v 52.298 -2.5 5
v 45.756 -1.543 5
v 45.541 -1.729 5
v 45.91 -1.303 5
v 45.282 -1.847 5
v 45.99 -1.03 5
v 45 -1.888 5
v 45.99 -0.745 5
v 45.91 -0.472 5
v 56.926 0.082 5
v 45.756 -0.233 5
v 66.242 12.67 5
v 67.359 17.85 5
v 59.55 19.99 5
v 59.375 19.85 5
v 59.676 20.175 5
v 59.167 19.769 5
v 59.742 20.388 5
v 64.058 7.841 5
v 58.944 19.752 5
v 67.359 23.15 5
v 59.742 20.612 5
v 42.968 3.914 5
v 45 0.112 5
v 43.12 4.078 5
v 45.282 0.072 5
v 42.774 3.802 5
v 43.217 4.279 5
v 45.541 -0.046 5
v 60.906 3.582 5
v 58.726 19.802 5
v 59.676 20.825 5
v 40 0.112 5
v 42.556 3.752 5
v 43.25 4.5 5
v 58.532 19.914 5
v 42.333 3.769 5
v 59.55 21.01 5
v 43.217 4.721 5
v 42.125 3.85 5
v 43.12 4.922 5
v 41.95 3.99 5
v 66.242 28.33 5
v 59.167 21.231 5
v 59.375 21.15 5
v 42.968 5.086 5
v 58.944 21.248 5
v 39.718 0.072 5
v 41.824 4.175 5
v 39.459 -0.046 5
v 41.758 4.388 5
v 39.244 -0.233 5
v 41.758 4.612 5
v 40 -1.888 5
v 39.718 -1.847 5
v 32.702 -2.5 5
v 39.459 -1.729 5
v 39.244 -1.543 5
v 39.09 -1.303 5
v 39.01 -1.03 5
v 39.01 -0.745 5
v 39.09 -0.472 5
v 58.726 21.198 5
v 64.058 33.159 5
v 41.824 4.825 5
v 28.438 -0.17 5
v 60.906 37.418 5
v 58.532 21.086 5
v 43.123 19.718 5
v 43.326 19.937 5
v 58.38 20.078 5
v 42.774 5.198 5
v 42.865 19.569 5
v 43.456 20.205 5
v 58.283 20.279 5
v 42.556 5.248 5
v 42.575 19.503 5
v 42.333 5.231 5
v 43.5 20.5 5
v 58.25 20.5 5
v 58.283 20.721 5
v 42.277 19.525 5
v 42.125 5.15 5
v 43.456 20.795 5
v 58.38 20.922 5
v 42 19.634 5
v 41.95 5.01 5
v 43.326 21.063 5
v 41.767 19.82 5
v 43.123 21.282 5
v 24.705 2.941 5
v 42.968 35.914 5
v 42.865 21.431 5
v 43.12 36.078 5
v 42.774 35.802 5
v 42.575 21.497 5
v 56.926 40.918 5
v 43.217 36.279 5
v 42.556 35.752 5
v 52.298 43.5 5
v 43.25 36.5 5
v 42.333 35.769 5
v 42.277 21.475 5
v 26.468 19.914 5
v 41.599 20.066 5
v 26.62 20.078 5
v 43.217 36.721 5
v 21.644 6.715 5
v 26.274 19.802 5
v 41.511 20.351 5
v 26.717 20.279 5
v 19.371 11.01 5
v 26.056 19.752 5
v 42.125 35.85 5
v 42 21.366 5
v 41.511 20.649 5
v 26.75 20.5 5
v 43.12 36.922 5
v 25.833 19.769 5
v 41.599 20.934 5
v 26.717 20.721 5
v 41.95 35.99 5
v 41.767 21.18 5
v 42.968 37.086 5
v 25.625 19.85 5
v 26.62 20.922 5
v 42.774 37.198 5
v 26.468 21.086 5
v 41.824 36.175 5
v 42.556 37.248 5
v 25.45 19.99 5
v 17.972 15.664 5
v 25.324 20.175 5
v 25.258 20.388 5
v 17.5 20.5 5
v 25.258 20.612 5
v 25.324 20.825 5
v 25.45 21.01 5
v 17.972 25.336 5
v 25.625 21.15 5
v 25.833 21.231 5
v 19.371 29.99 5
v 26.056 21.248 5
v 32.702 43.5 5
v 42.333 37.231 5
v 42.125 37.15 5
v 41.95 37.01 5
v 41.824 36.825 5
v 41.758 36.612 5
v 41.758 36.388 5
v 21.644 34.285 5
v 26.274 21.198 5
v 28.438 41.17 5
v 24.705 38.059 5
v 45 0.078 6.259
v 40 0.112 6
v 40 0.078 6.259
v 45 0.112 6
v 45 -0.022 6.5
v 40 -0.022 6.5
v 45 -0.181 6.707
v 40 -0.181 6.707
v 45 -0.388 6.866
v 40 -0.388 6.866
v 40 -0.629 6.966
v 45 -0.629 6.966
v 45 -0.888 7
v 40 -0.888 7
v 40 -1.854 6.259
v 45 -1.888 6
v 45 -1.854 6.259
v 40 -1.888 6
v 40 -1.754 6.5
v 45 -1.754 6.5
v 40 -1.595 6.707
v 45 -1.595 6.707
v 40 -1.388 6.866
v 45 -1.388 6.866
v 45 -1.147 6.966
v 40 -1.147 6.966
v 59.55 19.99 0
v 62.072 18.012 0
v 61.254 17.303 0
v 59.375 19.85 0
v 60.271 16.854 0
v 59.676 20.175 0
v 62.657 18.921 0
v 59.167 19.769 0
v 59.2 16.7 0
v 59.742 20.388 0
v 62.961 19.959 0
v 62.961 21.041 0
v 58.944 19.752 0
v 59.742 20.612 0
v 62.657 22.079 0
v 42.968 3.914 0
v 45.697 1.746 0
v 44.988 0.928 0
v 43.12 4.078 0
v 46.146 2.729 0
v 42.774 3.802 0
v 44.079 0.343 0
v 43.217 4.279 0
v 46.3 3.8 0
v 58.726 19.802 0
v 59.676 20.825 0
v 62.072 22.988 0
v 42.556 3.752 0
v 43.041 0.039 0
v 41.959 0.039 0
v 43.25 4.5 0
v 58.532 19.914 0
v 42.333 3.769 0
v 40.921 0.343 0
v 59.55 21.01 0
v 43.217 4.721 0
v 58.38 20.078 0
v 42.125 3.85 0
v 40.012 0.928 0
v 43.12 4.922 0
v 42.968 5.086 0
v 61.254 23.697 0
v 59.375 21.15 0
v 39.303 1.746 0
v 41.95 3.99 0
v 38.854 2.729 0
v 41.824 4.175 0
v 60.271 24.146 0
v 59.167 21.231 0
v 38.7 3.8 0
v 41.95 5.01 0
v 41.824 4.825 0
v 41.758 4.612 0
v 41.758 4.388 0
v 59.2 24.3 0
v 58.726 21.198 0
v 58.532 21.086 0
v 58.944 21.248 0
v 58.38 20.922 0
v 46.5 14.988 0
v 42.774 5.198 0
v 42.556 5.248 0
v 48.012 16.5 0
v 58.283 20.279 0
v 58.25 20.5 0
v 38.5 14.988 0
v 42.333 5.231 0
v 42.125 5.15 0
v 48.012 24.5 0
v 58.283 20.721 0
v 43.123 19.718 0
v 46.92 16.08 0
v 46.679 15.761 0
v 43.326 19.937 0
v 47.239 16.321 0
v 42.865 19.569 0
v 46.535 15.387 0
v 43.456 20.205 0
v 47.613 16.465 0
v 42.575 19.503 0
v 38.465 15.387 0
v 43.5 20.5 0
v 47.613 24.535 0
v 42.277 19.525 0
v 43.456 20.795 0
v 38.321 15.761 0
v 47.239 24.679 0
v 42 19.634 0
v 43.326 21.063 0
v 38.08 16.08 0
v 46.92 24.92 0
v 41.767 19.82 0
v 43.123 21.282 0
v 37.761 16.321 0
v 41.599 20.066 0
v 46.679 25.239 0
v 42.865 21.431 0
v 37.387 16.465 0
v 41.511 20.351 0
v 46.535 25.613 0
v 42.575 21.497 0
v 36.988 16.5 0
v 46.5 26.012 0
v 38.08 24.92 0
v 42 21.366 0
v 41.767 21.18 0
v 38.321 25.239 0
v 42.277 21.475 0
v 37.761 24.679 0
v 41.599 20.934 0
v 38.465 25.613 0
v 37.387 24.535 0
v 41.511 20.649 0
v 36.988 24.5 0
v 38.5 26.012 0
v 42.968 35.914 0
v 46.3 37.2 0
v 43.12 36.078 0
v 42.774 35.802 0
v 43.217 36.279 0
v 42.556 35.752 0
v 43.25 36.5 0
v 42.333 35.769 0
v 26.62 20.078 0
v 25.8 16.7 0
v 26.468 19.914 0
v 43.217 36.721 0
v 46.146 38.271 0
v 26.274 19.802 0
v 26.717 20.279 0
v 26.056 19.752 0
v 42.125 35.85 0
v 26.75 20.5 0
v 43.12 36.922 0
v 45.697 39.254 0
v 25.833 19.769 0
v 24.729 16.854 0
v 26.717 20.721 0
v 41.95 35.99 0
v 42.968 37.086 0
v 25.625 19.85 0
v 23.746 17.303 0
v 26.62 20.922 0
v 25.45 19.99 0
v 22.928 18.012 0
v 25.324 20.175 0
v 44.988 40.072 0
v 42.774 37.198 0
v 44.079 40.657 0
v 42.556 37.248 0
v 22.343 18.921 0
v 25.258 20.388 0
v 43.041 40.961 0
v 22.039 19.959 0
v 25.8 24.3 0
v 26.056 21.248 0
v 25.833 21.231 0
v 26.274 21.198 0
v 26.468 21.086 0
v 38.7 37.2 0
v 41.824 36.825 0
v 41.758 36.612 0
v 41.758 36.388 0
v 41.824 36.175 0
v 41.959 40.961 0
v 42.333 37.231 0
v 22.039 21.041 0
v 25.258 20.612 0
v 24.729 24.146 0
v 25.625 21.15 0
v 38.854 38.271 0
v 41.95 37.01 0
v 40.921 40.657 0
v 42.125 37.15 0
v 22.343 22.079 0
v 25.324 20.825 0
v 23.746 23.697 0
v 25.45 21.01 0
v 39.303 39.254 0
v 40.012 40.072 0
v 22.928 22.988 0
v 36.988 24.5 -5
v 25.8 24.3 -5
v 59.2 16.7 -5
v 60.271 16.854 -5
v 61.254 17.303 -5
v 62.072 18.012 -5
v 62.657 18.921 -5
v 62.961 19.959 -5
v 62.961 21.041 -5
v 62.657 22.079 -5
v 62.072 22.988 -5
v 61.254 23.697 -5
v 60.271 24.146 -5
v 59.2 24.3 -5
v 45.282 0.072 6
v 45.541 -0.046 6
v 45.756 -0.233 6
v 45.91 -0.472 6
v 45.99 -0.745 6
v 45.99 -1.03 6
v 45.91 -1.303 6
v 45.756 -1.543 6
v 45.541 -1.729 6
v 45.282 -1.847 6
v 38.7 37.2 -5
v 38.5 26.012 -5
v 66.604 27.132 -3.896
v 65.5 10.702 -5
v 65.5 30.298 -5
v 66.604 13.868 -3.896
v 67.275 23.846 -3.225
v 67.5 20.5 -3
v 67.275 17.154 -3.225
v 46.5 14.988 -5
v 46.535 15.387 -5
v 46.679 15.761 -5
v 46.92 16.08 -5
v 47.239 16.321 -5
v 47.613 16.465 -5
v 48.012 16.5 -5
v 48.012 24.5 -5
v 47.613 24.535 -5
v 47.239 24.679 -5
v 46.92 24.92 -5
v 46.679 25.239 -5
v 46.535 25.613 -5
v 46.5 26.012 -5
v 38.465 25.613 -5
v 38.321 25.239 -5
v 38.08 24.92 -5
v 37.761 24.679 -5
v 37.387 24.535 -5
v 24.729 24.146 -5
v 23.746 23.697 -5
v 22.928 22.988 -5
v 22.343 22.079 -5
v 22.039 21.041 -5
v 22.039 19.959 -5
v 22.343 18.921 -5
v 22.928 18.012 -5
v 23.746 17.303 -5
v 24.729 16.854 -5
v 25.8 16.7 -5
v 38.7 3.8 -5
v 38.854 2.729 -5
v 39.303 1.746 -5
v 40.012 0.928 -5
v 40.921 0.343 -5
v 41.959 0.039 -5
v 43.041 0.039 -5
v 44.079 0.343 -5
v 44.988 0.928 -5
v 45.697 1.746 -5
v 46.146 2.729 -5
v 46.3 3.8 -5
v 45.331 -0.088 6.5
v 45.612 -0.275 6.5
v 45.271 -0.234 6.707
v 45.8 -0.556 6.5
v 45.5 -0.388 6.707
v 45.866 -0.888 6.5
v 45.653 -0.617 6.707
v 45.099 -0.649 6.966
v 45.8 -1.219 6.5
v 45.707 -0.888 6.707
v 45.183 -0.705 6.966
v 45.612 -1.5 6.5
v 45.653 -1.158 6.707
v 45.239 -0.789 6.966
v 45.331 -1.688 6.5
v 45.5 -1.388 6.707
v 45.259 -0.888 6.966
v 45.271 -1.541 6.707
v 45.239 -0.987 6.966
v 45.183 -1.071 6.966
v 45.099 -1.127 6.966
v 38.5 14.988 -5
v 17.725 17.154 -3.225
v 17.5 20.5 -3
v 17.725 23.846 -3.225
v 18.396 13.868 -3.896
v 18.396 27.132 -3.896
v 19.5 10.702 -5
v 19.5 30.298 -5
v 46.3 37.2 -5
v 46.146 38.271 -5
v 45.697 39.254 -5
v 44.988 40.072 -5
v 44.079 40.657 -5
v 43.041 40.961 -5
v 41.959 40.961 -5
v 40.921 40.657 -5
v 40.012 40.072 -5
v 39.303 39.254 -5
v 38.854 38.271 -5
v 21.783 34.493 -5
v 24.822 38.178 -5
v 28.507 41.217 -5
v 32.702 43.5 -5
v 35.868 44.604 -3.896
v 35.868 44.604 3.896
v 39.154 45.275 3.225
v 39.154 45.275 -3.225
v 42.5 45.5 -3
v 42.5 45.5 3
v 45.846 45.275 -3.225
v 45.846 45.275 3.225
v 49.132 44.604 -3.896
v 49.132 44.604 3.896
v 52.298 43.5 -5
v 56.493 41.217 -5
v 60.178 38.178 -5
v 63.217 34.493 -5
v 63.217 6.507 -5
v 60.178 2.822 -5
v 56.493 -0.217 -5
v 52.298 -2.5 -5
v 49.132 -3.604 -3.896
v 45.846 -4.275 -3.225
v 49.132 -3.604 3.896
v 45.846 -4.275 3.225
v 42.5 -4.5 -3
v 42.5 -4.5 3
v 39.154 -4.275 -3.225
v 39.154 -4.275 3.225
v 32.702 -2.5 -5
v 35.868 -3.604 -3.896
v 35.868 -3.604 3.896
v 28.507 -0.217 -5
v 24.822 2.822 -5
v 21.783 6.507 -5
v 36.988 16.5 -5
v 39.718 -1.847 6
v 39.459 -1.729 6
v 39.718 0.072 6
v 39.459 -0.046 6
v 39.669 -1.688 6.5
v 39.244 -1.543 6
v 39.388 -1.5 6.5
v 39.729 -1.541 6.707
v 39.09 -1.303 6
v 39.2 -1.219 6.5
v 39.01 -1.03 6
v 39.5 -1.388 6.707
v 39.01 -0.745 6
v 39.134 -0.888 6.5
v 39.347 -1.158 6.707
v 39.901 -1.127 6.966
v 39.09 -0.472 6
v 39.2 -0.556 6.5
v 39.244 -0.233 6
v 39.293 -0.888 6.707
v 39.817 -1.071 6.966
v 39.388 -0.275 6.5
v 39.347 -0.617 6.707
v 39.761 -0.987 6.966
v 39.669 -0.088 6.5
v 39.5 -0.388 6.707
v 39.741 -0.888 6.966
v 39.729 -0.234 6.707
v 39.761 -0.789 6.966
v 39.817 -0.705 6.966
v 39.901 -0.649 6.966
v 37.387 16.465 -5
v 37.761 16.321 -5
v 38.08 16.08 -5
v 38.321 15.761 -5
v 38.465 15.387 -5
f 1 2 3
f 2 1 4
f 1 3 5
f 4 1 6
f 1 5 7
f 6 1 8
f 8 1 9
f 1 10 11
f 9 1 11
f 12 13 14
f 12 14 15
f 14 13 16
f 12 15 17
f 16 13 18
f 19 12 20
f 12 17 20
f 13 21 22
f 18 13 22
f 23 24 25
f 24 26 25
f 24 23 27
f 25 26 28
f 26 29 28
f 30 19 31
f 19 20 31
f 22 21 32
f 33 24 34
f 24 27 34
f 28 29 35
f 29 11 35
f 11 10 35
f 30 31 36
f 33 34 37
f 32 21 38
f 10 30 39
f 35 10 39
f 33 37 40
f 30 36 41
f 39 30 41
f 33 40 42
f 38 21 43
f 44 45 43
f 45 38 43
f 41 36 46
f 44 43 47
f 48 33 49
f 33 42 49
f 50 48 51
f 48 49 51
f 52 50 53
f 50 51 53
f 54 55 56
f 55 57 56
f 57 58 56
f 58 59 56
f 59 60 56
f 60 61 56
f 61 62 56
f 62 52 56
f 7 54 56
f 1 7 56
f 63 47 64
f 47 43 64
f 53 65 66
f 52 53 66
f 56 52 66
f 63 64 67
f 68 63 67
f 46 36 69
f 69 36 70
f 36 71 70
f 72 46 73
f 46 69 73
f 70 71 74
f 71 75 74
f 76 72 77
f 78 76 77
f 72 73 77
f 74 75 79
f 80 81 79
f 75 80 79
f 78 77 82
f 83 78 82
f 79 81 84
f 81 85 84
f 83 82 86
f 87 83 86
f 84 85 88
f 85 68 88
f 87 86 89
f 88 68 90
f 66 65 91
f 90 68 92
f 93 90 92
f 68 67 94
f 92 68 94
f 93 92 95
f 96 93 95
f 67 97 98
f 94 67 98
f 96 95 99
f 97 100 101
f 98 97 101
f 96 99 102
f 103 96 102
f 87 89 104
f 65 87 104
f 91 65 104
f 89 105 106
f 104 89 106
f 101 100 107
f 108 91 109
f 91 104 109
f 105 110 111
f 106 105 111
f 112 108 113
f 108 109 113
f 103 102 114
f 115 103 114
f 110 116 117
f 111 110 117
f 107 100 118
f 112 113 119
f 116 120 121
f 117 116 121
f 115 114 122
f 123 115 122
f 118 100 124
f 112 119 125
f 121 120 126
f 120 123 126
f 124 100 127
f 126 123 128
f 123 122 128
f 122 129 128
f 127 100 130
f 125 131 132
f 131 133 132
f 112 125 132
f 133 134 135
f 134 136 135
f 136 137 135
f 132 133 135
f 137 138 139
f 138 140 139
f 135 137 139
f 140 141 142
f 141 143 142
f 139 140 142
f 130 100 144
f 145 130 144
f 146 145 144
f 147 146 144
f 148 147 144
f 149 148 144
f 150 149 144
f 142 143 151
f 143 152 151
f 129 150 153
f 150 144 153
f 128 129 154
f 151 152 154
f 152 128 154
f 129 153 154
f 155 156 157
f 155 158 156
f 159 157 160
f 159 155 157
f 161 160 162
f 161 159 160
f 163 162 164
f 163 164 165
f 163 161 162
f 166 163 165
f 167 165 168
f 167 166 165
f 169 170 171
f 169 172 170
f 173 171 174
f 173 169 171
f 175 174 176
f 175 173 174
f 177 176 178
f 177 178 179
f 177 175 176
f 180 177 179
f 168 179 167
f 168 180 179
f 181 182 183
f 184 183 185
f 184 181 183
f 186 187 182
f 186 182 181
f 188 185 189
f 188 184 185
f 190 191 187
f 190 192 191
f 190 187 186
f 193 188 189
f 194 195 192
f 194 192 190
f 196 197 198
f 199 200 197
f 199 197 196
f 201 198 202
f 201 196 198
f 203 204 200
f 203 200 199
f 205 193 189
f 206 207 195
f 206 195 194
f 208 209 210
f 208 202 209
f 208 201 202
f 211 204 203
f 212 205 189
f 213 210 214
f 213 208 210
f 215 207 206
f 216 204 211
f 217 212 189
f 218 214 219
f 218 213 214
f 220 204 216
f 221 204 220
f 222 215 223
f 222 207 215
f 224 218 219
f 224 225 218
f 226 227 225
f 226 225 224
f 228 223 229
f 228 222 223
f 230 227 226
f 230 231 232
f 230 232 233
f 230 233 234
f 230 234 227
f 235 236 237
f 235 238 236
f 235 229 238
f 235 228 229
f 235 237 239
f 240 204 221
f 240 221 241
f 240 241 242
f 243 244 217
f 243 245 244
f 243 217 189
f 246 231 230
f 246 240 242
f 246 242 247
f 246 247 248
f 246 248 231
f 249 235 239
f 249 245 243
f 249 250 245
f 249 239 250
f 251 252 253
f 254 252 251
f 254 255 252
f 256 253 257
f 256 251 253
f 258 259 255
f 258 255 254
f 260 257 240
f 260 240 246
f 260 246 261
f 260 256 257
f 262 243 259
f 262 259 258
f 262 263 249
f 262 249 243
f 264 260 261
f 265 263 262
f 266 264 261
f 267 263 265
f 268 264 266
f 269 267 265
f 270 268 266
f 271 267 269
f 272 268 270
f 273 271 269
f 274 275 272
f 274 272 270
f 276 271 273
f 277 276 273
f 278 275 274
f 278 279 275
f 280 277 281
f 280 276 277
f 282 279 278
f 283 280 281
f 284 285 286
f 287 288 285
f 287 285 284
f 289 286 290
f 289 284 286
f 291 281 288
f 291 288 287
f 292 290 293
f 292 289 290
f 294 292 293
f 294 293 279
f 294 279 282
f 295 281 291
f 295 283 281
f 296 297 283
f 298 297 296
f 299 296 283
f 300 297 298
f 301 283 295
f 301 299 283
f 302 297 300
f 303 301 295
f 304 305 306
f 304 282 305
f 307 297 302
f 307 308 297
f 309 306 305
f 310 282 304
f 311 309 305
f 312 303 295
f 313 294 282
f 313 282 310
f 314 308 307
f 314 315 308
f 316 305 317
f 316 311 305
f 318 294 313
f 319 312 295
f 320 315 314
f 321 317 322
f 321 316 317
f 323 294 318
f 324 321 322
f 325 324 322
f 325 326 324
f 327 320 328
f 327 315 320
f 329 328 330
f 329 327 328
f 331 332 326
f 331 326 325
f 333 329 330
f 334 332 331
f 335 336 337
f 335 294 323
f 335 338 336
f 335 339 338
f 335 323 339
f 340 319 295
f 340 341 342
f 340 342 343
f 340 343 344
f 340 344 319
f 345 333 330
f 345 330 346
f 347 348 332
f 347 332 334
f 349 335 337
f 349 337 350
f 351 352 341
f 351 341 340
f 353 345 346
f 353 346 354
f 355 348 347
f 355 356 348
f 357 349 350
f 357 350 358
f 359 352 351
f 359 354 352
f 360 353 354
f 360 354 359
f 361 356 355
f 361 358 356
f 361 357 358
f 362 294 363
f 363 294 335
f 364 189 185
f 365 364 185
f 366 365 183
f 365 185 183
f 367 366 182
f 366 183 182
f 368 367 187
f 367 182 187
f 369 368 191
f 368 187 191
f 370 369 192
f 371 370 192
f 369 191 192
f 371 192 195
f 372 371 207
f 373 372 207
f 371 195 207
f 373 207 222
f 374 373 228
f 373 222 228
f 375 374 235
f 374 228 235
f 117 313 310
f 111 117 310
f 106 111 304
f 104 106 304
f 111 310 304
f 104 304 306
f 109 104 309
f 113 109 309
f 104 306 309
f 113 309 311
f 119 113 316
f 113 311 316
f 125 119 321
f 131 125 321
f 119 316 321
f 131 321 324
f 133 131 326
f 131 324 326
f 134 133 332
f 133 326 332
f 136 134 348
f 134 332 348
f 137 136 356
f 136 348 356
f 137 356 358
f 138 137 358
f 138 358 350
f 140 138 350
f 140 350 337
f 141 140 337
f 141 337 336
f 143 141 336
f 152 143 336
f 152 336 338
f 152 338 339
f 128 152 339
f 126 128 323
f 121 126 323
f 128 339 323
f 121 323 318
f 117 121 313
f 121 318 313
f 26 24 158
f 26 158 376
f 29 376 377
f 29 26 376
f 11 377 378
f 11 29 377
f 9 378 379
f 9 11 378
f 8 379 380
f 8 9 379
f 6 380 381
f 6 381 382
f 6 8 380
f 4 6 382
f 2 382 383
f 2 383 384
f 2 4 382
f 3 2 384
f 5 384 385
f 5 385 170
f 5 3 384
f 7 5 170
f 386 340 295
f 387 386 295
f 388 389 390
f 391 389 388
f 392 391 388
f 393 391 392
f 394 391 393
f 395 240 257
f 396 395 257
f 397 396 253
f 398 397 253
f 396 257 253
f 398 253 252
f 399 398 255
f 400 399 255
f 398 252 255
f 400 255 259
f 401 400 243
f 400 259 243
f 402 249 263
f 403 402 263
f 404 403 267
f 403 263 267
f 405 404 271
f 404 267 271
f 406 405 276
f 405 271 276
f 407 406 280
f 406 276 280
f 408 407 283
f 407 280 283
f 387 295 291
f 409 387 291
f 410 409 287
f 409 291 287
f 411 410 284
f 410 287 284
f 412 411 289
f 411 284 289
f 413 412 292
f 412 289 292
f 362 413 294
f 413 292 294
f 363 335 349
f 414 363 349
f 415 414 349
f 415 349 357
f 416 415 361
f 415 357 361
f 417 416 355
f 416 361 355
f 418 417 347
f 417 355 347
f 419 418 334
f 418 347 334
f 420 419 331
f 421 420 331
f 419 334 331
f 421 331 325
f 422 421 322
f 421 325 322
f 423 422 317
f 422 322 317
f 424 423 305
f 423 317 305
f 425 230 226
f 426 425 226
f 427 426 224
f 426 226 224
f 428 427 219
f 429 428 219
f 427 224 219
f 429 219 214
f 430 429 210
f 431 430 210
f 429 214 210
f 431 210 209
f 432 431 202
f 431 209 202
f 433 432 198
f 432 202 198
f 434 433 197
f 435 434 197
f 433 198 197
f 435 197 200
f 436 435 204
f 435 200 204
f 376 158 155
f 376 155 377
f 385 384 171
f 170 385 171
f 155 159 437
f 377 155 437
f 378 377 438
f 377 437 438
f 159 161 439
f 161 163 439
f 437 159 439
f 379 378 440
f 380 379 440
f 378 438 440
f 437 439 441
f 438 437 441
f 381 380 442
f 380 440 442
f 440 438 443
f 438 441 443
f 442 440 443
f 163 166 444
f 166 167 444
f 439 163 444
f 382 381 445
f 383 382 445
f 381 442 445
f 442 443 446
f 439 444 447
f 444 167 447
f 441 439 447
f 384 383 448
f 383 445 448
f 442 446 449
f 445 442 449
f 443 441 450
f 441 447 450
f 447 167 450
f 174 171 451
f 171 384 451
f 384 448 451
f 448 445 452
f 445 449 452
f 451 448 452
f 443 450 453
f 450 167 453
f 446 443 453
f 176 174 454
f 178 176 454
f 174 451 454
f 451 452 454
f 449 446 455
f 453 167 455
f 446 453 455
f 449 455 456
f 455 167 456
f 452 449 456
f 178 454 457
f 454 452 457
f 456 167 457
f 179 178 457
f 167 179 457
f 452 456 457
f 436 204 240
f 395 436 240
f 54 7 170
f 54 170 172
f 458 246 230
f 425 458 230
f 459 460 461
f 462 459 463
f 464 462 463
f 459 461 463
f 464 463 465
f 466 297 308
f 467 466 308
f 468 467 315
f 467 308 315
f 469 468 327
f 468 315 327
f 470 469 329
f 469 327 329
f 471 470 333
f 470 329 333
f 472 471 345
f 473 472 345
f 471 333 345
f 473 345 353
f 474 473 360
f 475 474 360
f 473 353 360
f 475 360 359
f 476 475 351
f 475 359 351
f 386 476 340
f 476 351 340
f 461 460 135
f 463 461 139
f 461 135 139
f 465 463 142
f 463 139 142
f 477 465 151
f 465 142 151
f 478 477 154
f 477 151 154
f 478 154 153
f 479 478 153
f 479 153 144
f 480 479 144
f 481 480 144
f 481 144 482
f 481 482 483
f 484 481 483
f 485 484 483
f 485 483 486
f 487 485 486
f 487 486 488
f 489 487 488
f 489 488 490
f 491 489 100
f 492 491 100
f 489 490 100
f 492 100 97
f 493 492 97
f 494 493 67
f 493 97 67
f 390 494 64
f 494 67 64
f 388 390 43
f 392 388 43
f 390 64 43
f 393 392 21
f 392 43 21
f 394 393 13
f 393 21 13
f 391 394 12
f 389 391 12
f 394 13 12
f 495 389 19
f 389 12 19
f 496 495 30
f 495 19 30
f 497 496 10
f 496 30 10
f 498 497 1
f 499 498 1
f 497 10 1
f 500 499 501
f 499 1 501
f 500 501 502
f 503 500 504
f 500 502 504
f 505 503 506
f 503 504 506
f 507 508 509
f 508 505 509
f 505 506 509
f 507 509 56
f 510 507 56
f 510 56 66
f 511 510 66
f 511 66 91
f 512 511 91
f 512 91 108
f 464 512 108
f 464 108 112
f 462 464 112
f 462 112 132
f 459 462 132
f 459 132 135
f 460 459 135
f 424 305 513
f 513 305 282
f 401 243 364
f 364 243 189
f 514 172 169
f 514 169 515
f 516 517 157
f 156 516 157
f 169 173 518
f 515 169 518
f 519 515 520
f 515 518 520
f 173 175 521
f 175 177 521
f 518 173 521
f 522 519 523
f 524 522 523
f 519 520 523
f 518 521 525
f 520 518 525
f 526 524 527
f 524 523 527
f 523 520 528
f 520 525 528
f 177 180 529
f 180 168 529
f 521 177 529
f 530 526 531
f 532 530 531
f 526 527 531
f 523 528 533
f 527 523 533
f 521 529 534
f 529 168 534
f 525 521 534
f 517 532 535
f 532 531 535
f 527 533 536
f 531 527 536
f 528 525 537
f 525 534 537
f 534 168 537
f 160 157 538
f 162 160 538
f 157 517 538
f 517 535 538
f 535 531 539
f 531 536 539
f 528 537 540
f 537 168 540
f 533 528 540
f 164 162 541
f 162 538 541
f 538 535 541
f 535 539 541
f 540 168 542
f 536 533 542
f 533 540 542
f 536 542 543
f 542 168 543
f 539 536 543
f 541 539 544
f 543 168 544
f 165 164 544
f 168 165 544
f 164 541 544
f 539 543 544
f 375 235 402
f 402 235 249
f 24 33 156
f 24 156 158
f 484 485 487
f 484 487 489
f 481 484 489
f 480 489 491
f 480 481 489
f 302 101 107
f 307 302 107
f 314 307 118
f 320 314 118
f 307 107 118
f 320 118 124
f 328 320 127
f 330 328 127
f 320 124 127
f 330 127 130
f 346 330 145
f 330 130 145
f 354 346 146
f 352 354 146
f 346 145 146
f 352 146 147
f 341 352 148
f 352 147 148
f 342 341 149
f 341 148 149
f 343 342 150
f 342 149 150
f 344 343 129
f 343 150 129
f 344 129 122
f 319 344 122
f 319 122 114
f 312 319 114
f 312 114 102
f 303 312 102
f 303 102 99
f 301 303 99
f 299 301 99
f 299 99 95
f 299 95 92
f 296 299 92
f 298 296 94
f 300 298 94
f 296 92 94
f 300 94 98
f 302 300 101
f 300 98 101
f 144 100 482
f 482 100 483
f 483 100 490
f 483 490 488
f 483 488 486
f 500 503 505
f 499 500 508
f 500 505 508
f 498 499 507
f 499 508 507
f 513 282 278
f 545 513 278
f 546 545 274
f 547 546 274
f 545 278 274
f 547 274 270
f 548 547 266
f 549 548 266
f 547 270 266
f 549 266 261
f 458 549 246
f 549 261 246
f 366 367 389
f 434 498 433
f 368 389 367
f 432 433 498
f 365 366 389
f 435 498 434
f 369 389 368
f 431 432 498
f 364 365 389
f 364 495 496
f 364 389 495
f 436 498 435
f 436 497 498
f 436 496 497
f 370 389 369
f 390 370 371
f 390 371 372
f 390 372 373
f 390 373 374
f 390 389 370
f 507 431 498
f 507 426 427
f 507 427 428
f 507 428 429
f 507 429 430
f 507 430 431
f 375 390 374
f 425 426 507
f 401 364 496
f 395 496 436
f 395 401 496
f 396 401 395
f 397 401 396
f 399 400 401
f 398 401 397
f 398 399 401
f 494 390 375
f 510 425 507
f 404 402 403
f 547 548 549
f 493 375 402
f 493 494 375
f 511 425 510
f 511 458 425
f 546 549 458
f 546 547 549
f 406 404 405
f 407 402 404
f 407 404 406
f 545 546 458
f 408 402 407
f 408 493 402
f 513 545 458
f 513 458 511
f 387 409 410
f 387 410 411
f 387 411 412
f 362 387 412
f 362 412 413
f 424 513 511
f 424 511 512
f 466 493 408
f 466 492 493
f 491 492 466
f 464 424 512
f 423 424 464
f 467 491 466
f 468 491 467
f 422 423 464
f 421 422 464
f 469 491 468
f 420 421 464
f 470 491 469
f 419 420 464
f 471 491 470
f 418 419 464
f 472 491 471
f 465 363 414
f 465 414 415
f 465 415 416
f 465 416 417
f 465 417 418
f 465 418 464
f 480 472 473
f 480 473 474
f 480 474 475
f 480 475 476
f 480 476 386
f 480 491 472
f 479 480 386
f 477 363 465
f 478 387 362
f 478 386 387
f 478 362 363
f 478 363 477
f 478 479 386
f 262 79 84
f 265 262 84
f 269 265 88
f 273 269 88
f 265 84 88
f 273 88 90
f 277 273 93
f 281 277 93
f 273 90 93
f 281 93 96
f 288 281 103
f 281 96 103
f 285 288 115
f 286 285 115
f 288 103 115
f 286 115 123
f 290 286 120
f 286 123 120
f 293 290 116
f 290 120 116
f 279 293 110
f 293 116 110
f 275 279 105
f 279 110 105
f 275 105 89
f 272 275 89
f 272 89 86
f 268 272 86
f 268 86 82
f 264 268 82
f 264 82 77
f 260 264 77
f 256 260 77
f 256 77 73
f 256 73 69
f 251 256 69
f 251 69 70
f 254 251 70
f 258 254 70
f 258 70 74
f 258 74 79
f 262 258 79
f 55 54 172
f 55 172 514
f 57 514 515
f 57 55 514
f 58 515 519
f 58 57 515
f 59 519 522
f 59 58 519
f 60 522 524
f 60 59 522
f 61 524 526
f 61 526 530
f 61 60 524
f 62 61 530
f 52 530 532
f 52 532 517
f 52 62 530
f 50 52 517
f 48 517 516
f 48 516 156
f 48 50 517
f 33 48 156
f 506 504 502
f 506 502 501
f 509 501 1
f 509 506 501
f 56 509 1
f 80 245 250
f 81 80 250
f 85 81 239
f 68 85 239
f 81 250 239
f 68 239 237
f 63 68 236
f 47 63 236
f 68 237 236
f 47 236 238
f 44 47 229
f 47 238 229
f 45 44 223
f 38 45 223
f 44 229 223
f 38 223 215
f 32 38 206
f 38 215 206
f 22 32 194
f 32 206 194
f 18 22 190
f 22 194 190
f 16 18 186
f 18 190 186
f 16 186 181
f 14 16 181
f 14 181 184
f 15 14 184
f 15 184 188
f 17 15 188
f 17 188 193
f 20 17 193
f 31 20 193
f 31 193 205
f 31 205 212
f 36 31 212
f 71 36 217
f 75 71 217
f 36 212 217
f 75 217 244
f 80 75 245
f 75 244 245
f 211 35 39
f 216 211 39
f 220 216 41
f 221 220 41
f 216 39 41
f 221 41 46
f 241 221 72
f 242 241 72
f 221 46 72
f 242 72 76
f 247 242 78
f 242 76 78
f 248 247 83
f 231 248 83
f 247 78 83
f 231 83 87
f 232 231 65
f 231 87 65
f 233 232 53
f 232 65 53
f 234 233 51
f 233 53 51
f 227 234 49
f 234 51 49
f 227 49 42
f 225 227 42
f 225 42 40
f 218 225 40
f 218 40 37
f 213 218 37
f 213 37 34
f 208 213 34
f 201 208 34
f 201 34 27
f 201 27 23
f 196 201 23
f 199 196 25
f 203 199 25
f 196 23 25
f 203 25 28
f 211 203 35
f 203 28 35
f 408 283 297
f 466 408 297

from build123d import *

# Parameters (mm, degrees)
SKETCH10_W          = 50
SKETCH10_H          = 50
BOSS_EXTRUDE7_DEPTH = 5
SKETCH9_W           = 50
SKETCH9_H           = 50
BOSS_EXTRUDE8_DEPTH = 5
SKETCH11_R          = 0.75
CUT_EXTRUDE5_DEPTH  = 5
CHAMFER1_SIZE       = 2
SKETCH12_R          = 1
CUT_EXTRUDE6_DEPTH  = 10
SKETCH14_R          = 0.75
CUT_EXTRUDE8_DEPTH  = 5
BOSS_EXTRUDE9_DEPTH = 2
FILLET1_R           = 1
FILLET2_R           = 25


# Some blends are built 0.0001 mm under size
with BuildPart() as part:
    # Sketch10 → Boss-Extrude7 (new body)
    with BuildSketch(Plane(origin=(0, 0, 0), x_dir=(-1, 0, 0), z_dir=(0, 0, -1))):
        with Locations((-42.5, 20.5)):
            Rectangle(SKETCH10_W, SKETCH10_H)
    extrude(amount=-BOSS_EXTRUDE7_DEPTH)

    # Sketch9 → Boss-Extrude8 (add)
    with BuildSketch(Plane(origin=(0, 0, 0), x_dir=(-1, 0, 0), z_dir=(0, 0, -1))):
        with Locations((-42.5, 20.5)):
            Rectangle(SKETCH9_W, SKETCH9_H)
        with BuildLine():
            Line((-59.2, 24.3), (-48.011787453, 24.5))
            ThreePointArc((-48.011787453, 24.5), (-46.919880362, 24.919880362), (-46.5, 26.011787453))
            Line((-46.5, 26.011787453), (-46.3, 37.2))
            ThreePointArc((-46.3, 37.2), (-42.5, 41), (-38.7, 37.2))
            Line((-38.7, 37.2), (-38.5, 26.011787453))
            ThreePointArc((-38.5, 26.011787453), (-38.080119638, 24.919880362), (-36.988212547, 24.5))
            Line((-36.988212547, 24.5), (-25.8, 24.3))
            ThreePointArc((-25.8, 24.3), (-22, 20.5), (-25.8, 16.7))
            Line((-25.8, 16.7), (-36.988212547, 16.5))
            ThreePointArc((-36.988212547, 16.5), (-38.080119638, 16.080119638), (-38.5, 14.988212547))
            Line((-38.5, 14.988212547), (-38.7, 3.8))
            ThreePointArc((-38.7, 3.8), (-42.5, 0), (-46.3, 3.8))
            Line((-46.3, 3.8), (-46.5, 14.988212547))
            ThreePointArc((-46.5, 14.988212547), (-46.919880362, 16.080119638), (-48.011787453, 16.5))
            Line((-48.011787453, 16.5), (-59.2, 16.7))
            ThreePointArc((-59.2, 16.7), (-63, 20.5), (-59.2, 24.3))
        make_face(mode=Mode.SUBTRACT)
    extrude(amount=BOSS_EXTRUDE8_DEPTH)

    # Sketch11 → Cut-Extrude5 (cut)
    with BuildSketch(Plane(origin=(0, 0, 0), x_dir=(-1, 0, 0), z_dir=(0, 0, -1))):
        with Locations((-59, 20.5)):
            Circle(SKETCH11_R)
        with Locations(Location((-26, 20.5, 0), (0, 0, 180))):
            Circle(SKETCH11_R)
    extrude(amount=-CUT_EXTRUDE5_DEPTH, mode=Mode.SUBTRACT)

    # Chamfer1
    chamfer1_edges = [part.edges().sort_by_distance(p)[0] for p in [
        (42.5, 45.5, 5),
        (67.5, 20.5, -5),
        (42.5, -4.5, -5),
        (17.5, 20.5, -5),
        (42.5, 45.5, -5),
        (42.5, -4.5, 5),
    ]]
    chamfer(chamfer1_edges, length=CHAMFER1_SIZE)

    # Sketch12 → Cut-Extrude6 (cut)
    with BuildSketch(Plane.XY.offset(5)):
        with Locations((42.5, 20.5)):
            Circle(SKETCH12_R)
    extrude(amount=-CUT_EXTRUDE6_DEPTH, mode=Mode.SUBTRACT)

    # Sketch14 → Cut-Extrude8 (cut)
    with BuildSketch(Plane.XY.offset(5)):
        with Locations((42.5, 36.5)):
            Circle(SKETCH14_R)
        with Locations((42.5, 4.5)):
            Circle(SKETCH14_R)
    extrude(amount=-CUT_EXTRUDE8_DEPTH, mode=Mode.SUBTRACT)

    # Sketch15 → Boss-Extrude9 (add)
    with BuildSketch(Plane.XY.offset(5)):
        with BuildLine():
            Line((40, 0.112312602), (45, 0.112312602))
            ThreePointArc((45, 0.112312602), (46, -0.887687398), (45, -1.887687398))
            Line((45, -1.887687398), (40, -1.887687398))
            ThreePointArc((40, -1.887687398), (39, -0.887687398), (40, 0.112312602))
        make_face()
    extrude(amount=BOSS_EXTRUDE9_DEPTH)

    # Fillet1
    fillet1_edges = [part.edges().sort_by_distance(p)[0] for p in [
        (39, -0.887687398, 7),
        (42.5, -1.887687398, 7),
        (46, -0.887687398, 7),
        (42.5, 0.112312602, 7),
    ]]
    fillet(fillet1_edges, radius=FILLET1_R - 0.0001)  # a hair under: the kernel refuses the full size

    # Fillet2
    # the kernel refuses this fillet: 25 mm, written as the material it takes off along each edge
    with BuildSketch(Plane(origin=(17.5, 45.5, -65.5), x_dir=(0, -1, 0), z_dir=(0, 0, 1)), Plane(origin=(67.5, 45.5, 65.5), x_dir=(0, -1, 0), z_dir=(0, 0, -1))) as fillet2_piece_1:
        with BuildLine():
            CenterArc((FILLET2_R, FILLET2_R), FILLET2_R, 180, 90)
            Line((0, FILLET2_R), (0, 0))
            Line((0, 0), (FILLET2_R, 0))
        make_face()
    extrude(amount=131, mode=Mode.SUBTRACT)
    with BuildSketch(Plane(origin=(67.5, -4.5, 65.5), x_dir=(0, 1, 0), z_dir=(0, 0, -1)), Plane(origin=(17.5, -4.5, -65.5), x_dir=(0, 1, 0), z_dir=(0, 0, 1))) as fillet2_piece_2:
        with BuildLine():
            CenterArc((FILLET2_R, -FILLET2_R), FILLET2_R, 90, 90)
            Line((0, -FILLET2_R), (0, 0))
            Line((0, 0), (FILLET2_R, 0))
        make_face()
    extrude(amount=131, mode=Mode.SUBTRACT)


solid = part.part
